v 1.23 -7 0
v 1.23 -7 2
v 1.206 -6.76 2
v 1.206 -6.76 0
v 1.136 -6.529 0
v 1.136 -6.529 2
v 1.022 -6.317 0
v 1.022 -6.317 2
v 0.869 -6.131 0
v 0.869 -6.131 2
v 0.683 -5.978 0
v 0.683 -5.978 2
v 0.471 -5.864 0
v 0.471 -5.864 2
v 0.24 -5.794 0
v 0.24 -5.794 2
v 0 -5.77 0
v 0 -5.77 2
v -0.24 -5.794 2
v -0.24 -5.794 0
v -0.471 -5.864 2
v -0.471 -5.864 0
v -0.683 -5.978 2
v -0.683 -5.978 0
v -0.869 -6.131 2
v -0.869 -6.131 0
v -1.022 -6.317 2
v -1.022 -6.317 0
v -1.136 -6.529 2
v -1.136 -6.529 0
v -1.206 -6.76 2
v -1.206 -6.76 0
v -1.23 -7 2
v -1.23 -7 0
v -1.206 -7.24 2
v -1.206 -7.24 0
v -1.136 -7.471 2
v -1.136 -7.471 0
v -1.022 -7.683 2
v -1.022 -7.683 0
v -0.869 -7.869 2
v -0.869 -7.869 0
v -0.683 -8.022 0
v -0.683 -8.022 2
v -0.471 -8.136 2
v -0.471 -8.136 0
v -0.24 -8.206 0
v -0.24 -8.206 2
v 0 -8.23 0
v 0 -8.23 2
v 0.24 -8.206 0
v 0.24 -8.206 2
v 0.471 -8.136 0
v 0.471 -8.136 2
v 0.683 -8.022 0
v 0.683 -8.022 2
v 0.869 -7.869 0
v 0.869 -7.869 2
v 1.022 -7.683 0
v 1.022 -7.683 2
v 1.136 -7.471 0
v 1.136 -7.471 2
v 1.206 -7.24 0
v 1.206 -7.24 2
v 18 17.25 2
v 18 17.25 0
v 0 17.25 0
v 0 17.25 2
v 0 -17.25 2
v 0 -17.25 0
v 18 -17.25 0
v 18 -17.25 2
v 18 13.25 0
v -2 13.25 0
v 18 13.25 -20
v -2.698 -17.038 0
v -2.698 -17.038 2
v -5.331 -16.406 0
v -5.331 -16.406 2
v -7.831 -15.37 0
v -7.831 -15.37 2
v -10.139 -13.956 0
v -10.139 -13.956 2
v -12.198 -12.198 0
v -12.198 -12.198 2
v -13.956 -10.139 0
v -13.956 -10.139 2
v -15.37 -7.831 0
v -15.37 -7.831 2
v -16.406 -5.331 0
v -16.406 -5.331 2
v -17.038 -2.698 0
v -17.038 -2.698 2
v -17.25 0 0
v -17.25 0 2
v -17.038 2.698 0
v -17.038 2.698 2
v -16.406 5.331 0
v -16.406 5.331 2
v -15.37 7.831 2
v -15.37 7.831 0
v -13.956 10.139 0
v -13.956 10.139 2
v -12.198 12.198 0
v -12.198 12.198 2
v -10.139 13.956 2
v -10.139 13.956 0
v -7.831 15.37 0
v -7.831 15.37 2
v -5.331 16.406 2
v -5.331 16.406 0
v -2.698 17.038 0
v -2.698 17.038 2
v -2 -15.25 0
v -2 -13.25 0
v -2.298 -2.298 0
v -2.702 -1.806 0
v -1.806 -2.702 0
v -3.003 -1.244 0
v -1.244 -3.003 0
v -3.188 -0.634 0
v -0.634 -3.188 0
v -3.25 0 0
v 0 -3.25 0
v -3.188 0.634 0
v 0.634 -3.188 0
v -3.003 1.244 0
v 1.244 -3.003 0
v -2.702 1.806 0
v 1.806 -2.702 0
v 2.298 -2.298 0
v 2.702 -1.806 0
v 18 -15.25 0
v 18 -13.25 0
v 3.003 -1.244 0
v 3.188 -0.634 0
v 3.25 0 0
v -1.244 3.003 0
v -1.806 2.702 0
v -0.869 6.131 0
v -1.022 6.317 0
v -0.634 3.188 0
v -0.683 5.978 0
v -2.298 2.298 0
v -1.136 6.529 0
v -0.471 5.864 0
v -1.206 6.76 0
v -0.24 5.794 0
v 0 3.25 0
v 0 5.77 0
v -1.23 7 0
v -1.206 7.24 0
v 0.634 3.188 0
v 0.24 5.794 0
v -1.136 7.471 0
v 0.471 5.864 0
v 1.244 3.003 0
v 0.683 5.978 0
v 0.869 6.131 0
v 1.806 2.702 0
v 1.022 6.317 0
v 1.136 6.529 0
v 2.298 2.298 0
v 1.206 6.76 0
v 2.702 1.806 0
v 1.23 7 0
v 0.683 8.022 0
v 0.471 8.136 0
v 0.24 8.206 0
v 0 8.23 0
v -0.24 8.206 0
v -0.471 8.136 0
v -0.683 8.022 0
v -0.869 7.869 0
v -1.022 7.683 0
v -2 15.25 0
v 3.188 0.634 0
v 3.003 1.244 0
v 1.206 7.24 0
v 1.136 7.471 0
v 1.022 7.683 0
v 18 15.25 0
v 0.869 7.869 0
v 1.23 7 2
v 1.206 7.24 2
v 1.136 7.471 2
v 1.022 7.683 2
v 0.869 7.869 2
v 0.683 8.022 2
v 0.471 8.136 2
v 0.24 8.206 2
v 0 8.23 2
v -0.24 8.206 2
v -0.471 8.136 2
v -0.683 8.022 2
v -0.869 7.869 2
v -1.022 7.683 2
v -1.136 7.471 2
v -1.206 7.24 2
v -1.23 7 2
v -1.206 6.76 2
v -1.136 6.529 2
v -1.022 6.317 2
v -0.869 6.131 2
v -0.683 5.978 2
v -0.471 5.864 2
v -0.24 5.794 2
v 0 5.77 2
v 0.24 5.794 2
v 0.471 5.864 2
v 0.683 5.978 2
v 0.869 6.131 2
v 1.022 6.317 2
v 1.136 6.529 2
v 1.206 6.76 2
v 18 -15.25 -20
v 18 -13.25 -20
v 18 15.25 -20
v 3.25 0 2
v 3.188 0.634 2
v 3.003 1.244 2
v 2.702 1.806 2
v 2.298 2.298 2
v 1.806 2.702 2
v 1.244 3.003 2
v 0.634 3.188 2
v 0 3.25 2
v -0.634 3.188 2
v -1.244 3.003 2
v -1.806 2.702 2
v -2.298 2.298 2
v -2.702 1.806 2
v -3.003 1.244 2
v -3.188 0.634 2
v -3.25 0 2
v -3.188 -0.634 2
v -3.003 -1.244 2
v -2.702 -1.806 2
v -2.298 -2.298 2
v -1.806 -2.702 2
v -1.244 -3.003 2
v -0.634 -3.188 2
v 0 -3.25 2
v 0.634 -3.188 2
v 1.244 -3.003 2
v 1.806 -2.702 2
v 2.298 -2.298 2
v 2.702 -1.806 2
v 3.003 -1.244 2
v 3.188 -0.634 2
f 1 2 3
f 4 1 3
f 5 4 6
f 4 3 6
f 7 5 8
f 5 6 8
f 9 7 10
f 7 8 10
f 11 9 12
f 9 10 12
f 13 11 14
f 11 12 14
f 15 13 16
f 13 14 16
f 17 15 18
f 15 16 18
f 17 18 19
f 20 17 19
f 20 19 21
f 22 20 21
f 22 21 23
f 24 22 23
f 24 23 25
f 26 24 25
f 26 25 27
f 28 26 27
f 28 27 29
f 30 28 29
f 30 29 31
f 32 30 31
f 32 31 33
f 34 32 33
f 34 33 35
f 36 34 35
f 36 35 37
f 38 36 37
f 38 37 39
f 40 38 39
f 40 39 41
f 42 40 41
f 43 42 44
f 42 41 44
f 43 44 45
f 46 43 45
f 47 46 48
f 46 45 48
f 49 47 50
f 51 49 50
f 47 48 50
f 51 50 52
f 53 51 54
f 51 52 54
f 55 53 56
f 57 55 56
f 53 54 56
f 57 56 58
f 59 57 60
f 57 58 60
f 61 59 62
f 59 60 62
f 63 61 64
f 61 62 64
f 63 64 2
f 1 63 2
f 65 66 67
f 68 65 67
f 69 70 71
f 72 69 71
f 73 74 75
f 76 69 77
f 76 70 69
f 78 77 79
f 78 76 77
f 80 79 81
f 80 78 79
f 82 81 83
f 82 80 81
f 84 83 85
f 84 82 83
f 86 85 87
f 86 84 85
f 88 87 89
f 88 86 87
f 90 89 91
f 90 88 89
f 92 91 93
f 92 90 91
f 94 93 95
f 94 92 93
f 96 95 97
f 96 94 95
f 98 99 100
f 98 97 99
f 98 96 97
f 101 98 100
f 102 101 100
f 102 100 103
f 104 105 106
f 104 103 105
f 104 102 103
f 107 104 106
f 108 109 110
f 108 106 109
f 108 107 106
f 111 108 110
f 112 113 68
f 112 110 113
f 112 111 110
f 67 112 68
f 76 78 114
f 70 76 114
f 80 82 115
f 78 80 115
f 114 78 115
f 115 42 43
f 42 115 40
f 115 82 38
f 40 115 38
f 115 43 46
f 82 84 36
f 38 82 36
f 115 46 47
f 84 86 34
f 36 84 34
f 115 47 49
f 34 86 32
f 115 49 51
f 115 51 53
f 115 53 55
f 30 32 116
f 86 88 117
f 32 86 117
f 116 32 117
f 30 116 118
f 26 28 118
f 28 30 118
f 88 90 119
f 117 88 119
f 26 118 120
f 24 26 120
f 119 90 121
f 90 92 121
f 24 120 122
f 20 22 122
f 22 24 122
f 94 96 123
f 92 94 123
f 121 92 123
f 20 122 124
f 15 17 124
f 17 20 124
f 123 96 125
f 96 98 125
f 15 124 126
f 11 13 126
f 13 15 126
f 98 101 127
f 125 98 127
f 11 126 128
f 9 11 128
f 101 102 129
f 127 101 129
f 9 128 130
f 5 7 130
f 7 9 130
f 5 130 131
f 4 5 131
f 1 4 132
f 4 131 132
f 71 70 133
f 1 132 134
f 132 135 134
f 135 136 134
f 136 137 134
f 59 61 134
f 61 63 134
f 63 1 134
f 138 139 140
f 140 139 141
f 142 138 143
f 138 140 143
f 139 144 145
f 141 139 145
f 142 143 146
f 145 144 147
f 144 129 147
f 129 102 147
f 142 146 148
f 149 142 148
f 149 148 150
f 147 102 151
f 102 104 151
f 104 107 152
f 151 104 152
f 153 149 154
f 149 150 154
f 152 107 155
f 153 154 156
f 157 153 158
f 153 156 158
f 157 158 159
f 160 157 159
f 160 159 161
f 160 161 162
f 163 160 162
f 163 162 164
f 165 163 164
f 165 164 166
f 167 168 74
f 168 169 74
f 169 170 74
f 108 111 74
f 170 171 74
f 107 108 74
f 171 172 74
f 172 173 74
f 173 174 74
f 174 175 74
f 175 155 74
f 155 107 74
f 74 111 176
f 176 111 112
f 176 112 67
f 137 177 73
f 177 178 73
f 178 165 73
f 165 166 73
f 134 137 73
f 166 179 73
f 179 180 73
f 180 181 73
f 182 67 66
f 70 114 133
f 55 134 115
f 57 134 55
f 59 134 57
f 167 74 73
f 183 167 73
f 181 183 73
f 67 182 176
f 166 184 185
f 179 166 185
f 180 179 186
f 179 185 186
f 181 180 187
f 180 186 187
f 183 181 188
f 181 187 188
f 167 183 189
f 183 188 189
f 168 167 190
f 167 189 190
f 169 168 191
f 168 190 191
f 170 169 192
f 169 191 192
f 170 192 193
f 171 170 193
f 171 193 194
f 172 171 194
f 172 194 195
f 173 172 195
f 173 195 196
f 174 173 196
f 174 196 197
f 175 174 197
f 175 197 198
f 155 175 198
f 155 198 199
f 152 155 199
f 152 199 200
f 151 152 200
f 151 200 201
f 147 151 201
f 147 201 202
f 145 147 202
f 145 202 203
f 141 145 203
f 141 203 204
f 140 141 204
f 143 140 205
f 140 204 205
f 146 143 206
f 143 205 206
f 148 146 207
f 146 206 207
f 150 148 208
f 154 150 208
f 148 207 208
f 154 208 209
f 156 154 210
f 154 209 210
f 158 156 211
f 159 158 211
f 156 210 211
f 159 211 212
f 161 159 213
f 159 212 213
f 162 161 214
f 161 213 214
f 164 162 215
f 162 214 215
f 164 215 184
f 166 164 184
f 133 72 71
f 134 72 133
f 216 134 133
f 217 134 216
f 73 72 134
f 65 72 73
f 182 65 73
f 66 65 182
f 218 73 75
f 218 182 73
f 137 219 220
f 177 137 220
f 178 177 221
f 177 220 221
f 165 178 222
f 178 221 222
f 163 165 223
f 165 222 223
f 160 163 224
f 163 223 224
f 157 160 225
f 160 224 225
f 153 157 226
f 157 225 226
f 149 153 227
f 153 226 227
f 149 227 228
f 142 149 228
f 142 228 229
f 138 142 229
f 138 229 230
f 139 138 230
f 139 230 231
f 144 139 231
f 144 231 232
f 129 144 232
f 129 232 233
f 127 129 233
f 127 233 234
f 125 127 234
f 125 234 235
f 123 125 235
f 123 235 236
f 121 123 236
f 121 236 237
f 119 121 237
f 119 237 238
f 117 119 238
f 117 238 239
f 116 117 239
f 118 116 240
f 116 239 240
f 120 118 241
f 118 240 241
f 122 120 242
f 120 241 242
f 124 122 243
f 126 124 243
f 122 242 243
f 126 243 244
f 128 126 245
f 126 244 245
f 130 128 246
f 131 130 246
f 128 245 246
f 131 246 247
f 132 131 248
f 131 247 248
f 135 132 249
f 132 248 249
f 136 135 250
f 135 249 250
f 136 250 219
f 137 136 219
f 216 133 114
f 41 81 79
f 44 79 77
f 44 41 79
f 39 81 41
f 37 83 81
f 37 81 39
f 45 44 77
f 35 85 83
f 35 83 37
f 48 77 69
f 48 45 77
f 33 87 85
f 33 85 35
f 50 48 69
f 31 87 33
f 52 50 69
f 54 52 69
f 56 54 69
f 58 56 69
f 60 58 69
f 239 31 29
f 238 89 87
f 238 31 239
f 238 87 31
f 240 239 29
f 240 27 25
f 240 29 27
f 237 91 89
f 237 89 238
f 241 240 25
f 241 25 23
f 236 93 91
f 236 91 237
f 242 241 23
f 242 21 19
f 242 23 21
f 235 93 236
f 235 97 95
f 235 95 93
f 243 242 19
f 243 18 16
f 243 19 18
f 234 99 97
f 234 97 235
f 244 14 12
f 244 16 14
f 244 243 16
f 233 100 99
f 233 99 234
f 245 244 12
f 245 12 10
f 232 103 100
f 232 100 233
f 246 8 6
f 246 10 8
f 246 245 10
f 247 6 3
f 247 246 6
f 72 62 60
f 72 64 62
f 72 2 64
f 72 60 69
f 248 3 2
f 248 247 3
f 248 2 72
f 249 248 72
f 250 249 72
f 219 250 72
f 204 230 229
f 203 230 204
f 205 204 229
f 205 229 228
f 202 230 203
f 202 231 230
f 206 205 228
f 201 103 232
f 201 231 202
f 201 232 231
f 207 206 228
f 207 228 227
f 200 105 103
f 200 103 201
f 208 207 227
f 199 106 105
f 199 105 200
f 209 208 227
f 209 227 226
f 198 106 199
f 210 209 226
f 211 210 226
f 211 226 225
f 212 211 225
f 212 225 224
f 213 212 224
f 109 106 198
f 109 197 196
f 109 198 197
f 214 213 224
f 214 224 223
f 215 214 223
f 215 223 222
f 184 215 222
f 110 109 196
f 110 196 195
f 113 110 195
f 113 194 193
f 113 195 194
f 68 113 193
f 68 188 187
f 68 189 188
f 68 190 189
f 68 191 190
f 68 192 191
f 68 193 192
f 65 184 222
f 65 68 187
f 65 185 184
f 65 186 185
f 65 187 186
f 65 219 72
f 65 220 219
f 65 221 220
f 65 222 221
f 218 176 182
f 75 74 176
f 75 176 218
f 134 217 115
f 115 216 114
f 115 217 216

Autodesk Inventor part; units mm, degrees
ref_plane "YZ Plane" through (0, 0, 0) normal (1, 0, 0) x (0, 1, 0)
ref_plane "XZ Plane" through (0, 0, 0) normal (0, 1, 0) x (-1, 0, 0)
ref_plane "XY Plane" through (0, 0, 0) normal (0, 0, 1) x (1, 0, 0)
ref_plane "Płaszczyzna konstrukcyjna1" through (0, 0, 0) normal (0, 0, 1) x (1, 0, 0)
sketch "Szkic1" plane through (0, 0, 0) normal (0, 0, 1) x (1, 0, 0)
  circle A0 centre (0, 0) radius 12.25 projected
  circle A1 centre (0, 7) radius 1.2295 projected
  circle A2 centre (0, -7) radius 1.2295 projected
  circle A3 centre (0, 0) radius 17.25
  line L0 (0, -17.25) -> (16, -17.25)
  line L1 (16, -17.25) -> (16, 17.25)
  line L2 (16, 17.25) -> (0, 17.25)
  line L3 (0, 17.25) -> (0, -17.25)
  point P0 (0, 0)
  dimension "d0" = 5
  dimension "d1" = 16
extrude "Wyciągnięcie proste1" add sketch "Szkic1" along normal blind 2
sketch "Szkic2" plane through (0, 0, 2) normal (0, 0, 1) x (1, 0, 0)
  arc A0 (-1.3229, 1.5) -> (1.3229, 1.5) centre (0, 0) ccw projected
  circle A1 centre (0, 7) radius 1.2295 projected
  circle A2 centre (0, -7) radius 1.2295 projected
  circle A3 centre (0, 0) radius 3.25 projected
  point P0 (0, 0)
extrude "Wyciągnięcie proste2" cut sketch "Szkic2" against normal up to next
sketch "Szkic3" plane through (16, -17.25, 0) normal (1, 0, 0) x (0, 0, -1)
  line L0 (0, 0) -> (0, 10.8031) projected
  line L1 (0, 34.5) -> (-2, 34.5) projected
  line L2 (-2, 0) -> (-2, 10.8031) projected
  line L3 (0, 0) -> (-2, 0) projected
  line L4 (-2, 34.5) -> (-2, 34.5)
  line L5 (-2, 34.5) -> (-2, 0)
  line L6 (-2, 0) -> (-2, 0)
  line L7 (-2, 0) -> (-2, 34.5)
  line L8 (0, 0) -> (-2, 0) projected
  line L9 (-2, 34.5) -> (-2, 34.5)
  line L10 (-2, 34.5) -> (-2, 0)
  line L11 (-2, 0) -> (-2, 0)
  line L12 (-2, 0) -> (-2, 34.5)
  line L13 (0, 10.8031) -> (-2, 10.8031) projected
  line L14 (-2, 23.6969) -> (0, 23.6969) projected
  line L15 (0, 23.6969) -> (0, 34.5) projected
  line L16 (-2, 23.6969) -> (-2, 34.5) projected
  point P0 (0, 17.25)
  dimension "d6" = 0
  dimension "d9" = 0
extrude "Wyciągnięcie proste3" add sketch "Szkic3" along normal blind 2
sketch "Szkic5" plane through (0, 0, 2) normal (0, 0, 1) x (1, 0, 0)
  line L0 (0, 17.25) -> (18, 17.25) projected
  line L1 (0, -17.25) -> (18, -17.25) projected
  line L2 (0, -17.25) -> (18, -17.25) projected
  line L3 (18, 17.25) -> (9, 17.25)
  line L4 (9, 17.25) -> (9, -17.25)
  line L5 (9, -17.25) -> (18, -17.25)
  line L6 (18, -17.25) -> (18, 17.25)
  point P0 (0, 0)
extrude "Wyciągnięcie proste4" add sketch "Szkic5" against normal up to surface (2 mm away)
ref_plane "Płaszczyzna konstrukcyjna2" through (0, 14.25, 2) normal (0, 1, 0) x (1, 0, 0)
sketch "Szkic7" plane through (0, 14.25, 2) normal (0, 1, 0) x (1, 0, 0)
  line L0 (18, 2) -> (18, 22)
  line L1 (18, 2) -> (-2, 2)
  line L2 (-3.25, 2) -> (3.25, 2) projected
  line L3 (-2, 2) -> (18, 22)
  point P0 (0, 2)
  dimension "d28" = 20
  dimension "d29" = 20
extrude "Wyciągnięcie proste6" add sketch "Szkic7" along normal mid plane 2
mirror "Odbicie lustrzane1" about plane through (0, 0, 0) normal (0, 1, 0) of "Wyciągnięcie proste6"
ref_plane "Płaszczyzna konstrukcyjna3" through (0, 0, 0) normal (0, 1, 0) x (-1, 0, 0)
properties part number "console"
